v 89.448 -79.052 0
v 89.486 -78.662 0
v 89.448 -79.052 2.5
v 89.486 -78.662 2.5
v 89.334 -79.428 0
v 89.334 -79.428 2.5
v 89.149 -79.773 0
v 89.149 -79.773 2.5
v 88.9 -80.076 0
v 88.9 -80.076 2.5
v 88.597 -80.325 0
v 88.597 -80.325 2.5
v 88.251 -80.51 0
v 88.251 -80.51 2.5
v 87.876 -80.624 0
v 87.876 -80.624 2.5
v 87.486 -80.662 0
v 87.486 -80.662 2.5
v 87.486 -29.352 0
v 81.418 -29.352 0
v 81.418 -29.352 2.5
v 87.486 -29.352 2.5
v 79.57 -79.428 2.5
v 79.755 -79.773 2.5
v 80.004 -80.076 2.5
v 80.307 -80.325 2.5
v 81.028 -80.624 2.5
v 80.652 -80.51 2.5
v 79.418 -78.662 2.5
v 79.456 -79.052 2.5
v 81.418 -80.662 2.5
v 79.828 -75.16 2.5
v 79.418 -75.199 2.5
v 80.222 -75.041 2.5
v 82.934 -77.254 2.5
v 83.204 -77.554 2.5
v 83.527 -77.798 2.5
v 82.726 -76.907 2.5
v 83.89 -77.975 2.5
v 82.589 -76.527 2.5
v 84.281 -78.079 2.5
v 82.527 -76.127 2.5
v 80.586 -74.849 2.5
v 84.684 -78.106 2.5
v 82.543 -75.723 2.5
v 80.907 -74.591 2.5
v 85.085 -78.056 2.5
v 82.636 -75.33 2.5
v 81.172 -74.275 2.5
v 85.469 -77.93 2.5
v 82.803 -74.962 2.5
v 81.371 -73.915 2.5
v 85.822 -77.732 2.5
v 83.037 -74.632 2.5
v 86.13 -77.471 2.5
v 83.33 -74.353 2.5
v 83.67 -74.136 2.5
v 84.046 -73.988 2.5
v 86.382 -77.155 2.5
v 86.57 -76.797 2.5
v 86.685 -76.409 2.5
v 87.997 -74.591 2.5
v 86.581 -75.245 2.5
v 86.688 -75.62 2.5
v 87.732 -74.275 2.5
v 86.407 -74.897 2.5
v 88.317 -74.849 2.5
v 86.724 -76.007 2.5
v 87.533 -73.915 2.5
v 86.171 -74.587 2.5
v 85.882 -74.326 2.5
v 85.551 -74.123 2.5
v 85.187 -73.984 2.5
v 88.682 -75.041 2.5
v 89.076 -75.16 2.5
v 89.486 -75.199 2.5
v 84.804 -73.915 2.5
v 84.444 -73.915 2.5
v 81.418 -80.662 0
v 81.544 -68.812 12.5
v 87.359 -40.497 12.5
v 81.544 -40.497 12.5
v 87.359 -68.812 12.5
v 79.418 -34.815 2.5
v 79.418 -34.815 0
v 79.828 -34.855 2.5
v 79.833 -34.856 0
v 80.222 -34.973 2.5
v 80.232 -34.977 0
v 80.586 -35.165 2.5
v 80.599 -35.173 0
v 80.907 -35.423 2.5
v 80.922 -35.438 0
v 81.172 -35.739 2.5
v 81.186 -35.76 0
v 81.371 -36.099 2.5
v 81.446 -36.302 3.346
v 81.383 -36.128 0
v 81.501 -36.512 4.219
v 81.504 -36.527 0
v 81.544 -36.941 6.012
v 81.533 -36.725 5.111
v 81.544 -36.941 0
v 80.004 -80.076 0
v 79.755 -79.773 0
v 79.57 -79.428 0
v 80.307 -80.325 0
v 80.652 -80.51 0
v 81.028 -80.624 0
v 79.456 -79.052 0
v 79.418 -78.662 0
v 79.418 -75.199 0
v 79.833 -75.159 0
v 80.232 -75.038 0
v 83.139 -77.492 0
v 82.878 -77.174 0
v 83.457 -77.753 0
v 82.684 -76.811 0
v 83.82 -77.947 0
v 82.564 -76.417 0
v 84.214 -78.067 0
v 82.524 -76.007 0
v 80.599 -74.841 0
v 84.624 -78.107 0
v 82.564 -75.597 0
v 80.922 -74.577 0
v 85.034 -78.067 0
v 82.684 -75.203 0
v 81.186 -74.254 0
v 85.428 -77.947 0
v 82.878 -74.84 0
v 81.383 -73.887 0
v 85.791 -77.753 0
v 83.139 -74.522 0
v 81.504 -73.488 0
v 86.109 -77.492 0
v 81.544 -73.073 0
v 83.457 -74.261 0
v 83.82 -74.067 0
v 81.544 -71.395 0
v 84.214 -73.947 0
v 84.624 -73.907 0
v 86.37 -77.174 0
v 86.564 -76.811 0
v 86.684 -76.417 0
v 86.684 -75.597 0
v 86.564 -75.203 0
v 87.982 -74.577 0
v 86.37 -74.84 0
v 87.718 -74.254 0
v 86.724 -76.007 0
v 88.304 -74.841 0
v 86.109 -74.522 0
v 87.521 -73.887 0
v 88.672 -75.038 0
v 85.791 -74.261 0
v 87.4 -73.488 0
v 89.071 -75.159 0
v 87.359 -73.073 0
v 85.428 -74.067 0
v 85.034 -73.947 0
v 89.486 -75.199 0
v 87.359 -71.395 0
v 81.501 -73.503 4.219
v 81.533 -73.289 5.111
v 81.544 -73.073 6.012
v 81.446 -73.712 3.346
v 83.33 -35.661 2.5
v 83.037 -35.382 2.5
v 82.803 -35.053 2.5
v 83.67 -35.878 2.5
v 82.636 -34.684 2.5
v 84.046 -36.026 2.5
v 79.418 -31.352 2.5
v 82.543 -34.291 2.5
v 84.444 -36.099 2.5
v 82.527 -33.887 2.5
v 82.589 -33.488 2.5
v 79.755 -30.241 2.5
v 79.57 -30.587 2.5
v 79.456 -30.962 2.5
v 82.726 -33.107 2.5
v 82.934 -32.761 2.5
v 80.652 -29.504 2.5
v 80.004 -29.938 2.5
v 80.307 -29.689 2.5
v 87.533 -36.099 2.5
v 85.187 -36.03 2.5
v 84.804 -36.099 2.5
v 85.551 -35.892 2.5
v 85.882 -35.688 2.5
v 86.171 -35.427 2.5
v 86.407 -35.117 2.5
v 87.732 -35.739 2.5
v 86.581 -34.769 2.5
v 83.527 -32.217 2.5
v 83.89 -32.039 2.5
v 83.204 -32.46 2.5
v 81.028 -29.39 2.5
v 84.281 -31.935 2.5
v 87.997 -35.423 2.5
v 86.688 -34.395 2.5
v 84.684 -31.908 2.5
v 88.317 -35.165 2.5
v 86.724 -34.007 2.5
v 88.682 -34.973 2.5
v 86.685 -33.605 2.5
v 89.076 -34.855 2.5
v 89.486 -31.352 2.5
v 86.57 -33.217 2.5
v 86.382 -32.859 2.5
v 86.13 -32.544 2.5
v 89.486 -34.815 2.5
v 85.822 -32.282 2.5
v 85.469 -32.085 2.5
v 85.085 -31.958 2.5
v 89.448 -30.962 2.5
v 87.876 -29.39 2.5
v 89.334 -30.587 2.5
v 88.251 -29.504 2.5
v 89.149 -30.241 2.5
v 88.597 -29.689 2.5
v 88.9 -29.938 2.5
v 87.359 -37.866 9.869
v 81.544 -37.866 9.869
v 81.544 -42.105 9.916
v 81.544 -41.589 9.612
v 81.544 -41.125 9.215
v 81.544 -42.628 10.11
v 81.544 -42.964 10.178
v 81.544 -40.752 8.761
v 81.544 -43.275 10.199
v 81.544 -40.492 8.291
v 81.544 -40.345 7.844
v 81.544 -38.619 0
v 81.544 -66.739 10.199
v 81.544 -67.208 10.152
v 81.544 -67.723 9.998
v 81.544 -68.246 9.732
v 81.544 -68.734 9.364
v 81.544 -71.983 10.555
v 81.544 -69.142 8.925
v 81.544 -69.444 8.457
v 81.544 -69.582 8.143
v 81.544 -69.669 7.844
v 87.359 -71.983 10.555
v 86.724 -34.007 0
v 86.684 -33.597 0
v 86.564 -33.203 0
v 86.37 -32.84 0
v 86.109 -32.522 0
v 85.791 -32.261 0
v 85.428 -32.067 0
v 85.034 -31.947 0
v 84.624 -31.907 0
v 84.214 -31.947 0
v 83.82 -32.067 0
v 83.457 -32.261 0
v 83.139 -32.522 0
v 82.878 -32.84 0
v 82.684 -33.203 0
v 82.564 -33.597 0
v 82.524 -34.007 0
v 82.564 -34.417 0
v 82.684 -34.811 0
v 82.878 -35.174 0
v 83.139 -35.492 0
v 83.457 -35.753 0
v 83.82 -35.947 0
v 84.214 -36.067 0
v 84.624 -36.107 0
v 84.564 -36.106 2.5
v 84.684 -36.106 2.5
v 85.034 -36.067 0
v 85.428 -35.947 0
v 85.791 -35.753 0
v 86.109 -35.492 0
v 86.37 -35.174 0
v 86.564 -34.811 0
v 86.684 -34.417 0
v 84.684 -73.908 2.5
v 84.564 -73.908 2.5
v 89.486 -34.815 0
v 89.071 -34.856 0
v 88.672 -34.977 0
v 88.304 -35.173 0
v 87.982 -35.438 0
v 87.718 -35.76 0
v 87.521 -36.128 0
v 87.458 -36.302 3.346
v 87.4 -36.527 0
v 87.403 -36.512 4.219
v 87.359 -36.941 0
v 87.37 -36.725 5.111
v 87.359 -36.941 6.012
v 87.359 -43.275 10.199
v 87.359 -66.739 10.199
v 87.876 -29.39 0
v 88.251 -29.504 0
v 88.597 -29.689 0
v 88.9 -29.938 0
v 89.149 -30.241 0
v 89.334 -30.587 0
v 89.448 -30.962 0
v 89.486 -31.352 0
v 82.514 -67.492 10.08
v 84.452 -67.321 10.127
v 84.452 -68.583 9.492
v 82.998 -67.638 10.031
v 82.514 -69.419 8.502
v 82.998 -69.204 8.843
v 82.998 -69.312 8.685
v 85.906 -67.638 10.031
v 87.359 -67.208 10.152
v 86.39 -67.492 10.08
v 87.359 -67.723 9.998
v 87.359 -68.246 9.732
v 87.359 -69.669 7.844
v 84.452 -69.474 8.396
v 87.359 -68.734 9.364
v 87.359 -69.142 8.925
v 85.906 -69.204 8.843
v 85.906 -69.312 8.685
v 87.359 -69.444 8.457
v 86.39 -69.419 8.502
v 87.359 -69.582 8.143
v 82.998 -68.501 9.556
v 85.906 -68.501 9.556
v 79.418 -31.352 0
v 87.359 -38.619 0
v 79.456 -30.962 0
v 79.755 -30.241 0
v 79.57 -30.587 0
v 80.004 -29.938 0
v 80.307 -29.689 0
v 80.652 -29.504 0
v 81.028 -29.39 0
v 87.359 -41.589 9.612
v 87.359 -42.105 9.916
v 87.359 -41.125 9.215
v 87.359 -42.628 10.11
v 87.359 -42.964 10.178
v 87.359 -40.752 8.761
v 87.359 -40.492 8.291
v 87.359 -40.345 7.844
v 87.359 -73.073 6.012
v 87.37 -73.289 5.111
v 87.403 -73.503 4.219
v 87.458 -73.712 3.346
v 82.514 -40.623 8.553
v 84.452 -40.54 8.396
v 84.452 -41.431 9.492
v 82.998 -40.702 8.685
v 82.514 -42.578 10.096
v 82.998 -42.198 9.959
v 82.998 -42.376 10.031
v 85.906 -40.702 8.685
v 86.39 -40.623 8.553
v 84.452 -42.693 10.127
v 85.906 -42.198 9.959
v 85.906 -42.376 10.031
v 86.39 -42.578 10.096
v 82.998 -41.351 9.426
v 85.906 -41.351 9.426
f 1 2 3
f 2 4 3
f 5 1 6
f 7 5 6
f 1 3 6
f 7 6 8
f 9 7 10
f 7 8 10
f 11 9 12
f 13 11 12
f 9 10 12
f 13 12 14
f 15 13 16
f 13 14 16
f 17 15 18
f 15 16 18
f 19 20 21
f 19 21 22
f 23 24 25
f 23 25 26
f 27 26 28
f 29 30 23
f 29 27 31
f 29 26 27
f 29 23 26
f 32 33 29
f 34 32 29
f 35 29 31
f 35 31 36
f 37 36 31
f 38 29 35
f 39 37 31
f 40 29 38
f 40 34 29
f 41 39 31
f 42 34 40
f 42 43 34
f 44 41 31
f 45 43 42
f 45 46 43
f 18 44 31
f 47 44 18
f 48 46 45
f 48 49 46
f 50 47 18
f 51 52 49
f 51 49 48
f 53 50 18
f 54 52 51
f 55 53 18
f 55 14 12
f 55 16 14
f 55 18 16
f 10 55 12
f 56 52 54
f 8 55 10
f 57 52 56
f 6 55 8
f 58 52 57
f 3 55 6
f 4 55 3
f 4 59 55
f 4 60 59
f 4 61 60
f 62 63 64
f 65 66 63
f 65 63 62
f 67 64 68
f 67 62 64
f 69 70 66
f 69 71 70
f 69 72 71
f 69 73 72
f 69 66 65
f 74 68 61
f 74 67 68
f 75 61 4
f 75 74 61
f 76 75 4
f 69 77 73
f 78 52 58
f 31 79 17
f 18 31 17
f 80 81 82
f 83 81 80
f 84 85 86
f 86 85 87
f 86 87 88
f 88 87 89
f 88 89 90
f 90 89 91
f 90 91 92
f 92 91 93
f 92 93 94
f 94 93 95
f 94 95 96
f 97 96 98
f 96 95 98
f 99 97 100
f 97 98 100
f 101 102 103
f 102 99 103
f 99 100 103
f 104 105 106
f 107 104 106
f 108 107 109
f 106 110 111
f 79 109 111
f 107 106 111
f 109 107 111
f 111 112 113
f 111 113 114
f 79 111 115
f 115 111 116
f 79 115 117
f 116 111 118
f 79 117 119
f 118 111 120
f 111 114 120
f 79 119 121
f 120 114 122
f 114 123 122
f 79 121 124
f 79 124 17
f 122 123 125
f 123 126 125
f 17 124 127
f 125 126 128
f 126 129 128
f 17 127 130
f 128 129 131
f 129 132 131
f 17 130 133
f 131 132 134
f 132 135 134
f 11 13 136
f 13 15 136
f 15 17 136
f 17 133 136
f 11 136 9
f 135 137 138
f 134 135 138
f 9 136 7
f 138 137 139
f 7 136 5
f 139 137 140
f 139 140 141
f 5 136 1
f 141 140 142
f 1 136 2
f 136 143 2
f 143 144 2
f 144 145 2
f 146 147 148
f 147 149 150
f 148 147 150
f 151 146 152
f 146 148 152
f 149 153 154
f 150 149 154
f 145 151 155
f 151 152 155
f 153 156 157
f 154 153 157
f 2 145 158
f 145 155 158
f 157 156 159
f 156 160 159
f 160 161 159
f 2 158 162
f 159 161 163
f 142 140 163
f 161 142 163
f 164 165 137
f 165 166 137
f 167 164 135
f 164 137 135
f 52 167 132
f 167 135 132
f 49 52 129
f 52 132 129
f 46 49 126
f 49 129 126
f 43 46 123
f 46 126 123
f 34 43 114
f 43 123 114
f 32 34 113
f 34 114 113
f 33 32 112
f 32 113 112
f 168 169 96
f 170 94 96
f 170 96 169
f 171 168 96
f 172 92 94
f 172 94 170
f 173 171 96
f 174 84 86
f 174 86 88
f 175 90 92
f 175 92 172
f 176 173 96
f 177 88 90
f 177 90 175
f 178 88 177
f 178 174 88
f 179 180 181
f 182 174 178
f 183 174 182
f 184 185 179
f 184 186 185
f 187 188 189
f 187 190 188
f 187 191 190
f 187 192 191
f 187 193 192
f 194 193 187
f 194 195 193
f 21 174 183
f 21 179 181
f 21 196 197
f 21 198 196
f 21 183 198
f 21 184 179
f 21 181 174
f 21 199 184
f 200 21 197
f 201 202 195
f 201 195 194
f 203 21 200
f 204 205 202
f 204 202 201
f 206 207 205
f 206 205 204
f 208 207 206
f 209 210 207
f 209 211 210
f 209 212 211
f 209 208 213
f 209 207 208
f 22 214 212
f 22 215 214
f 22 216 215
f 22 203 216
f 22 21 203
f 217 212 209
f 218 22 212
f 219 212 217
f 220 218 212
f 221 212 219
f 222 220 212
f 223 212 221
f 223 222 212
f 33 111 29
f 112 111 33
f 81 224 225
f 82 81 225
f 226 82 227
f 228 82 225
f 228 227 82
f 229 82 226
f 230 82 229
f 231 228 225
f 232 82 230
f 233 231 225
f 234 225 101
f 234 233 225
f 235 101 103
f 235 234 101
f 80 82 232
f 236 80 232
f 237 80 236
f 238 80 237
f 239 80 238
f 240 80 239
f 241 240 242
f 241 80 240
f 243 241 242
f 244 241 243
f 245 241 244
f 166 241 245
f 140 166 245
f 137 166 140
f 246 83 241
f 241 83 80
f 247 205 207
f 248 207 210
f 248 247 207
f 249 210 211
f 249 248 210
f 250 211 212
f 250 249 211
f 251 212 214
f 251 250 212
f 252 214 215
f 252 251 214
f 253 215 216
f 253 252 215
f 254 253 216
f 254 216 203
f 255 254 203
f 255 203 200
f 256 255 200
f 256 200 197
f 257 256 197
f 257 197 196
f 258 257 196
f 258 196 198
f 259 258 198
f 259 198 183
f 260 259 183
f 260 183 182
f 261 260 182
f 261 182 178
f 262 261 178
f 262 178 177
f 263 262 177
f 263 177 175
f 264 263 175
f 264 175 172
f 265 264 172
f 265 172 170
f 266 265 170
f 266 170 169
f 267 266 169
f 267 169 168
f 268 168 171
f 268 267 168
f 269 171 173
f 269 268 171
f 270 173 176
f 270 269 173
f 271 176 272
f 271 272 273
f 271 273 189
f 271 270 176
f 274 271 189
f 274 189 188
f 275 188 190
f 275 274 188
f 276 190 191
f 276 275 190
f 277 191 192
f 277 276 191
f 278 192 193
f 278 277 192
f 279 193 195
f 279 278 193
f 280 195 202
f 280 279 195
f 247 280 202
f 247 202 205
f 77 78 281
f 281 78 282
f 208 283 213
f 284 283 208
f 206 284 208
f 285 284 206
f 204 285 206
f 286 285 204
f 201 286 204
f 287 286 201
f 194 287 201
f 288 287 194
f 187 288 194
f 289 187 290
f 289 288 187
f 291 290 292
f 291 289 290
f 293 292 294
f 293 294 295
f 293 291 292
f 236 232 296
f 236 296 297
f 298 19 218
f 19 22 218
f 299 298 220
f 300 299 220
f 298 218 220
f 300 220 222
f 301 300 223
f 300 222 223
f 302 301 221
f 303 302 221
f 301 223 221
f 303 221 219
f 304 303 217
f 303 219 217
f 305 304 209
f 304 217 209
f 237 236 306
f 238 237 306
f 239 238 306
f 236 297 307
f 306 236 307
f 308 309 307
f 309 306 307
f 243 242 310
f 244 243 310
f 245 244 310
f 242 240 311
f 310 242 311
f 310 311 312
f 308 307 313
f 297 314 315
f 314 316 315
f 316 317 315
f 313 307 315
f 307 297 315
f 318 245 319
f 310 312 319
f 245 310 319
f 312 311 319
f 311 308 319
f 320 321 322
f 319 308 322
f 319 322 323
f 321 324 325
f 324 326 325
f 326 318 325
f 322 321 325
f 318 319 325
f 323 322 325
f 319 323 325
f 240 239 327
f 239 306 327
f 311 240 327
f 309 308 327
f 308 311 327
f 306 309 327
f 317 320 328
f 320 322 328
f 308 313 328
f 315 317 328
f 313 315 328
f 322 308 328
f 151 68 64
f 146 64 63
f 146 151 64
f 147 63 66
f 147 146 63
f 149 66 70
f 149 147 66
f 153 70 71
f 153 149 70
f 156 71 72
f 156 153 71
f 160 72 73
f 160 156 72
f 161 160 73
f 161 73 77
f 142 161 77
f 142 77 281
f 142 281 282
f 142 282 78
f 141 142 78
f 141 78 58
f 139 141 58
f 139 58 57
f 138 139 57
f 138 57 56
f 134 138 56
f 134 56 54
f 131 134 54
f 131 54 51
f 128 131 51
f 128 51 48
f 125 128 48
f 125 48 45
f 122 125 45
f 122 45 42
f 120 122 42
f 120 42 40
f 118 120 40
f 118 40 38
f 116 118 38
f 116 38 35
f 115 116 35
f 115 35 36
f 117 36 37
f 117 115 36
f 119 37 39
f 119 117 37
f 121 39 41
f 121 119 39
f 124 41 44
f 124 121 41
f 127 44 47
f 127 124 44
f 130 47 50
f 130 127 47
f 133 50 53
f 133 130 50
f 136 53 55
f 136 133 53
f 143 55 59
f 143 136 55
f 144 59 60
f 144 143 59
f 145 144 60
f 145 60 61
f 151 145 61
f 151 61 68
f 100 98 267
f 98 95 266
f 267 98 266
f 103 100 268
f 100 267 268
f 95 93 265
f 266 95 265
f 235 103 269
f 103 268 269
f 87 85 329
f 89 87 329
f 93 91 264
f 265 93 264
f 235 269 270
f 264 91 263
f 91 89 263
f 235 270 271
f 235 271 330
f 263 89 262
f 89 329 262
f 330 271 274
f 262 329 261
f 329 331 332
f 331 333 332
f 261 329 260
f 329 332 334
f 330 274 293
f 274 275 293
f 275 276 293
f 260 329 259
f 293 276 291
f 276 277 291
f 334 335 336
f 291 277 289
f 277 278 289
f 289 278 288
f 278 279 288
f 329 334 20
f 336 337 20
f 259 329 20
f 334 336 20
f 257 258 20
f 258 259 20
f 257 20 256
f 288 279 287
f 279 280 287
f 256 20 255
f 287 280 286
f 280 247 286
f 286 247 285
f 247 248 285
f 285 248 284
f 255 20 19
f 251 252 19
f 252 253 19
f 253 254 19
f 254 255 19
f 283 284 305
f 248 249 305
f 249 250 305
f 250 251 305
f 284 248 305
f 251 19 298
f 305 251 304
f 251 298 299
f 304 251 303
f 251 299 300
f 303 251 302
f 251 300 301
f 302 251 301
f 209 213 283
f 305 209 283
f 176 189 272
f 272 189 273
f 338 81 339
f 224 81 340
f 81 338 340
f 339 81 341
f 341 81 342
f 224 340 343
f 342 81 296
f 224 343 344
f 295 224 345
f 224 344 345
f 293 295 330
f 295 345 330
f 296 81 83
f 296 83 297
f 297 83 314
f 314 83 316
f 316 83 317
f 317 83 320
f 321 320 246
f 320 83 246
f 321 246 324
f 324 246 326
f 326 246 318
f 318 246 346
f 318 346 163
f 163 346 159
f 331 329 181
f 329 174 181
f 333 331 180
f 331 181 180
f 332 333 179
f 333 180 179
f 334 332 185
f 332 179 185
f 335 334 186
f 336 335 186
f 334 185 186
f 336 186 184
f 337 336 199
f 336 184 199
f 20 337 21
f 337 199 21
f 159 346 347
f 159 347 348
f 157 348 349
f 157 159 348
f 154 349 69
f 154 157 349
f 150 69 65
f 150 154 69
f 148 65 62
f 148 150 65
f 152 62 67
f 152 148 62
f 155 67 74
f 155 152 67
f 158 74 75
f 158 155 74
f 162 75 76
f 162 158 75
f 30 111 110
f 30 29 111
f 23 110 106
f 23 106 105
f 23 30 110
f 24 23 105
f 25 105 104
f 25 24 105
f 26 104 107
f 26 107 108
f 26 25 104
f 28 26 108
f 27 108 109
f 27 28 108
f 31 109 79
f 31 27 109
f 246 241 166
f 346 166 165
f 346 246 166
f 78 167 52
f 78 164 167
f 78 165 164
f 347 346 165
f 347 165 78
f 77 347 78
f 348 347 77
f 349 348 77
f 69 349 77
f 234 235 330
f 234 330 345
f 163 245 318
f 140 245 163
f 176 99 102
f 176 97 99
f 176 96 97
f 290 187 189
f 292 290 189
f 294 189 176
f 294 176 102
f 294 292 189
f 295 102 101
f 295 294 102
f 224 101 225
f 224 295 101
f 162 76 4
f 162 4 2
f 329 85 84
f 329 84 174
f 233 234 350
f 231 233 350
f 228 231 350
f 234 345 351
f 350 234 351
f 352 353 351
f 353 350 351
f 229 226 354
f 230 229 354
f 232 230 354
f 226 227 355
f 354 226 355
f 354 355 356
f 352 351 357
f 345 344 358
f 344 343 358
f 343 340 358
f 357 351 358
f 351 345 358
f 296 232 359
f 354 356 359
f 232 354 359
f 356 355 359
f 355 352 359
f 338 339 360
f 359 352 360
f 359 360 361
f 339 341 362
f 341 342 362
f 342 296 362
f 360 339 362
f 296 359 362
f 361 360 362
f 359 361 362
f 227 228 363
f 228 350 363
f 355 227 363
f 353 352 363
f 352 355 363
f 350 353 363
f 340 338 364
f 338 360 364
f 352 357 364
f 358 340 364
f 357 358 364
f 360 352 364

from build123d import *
from OCP.BRepFilletAPI import BRepFilletAPI_MakeChamfer

# Parameters (mm, degrees)
SKETCH_1_W               = 10.068208361
SKETCH_1_H               = 51.310344827
SKETCH_1_R               = 2.1
EXTRUDE_1_DEPTH          = 2.5
EXTRUDE_2_REACH          = 83.327
CUT_EXTRUDE_1_DEPTH      = 83.243670079
CUT_EXTRUDE_1_DEPTH_BACK = 83.243670079
CUT_EXTRUDE_2_DEPTH      = 122.121367623
CUT_EXTRUDE_2_DEPTH_BACK = 122.121367623
FILLET_2_R               = 2
CHAMFER_2_SIZE           = 2
CHAMFER_2_SIZE2          = 2.70532723


with BuildPart() as part:
    # 草图1 → 凸台-拉伸1 (new body)
    with BuildSketch(Plane.XY):
        with Locations((84.451834639, -55.007101597)):
            Rectangle(SKETCH_1_W, SKETCH_1_H)
        with Locations((84.623869854, -34.007101596)):
            Circle(SKETCH_1_R, mode=Mode.SUBTRACT)
        with Locations((84.623869854, -76.007101596)):
            Circle(SKETCH_1_R, mode=Mode.SUBTRACT)
    extrude(amount=EXTRUDE_1_DEPTH)

    # 凸台-拉伸2: up to this face of the body (flat: up to its plane)
    extrude_2_end = Plane(part.part.faces().sort_by_distance((79.417730458, -55.007101596, 1.25))[0])
    # 草图2 → 凸台-拉伸2 (add, up to the picked face)
    with BuildSketch(Plane(origin=(89.485938819, 0, 0), x_dir=(0, 0, -1), z_dir=(1, 0, 0)), mode=Mode.PRIVATE) as extrude_2_sk1:
        Polygon((-12.5, -71.517171054), (-2.5, -73.914822505), (-2.5, -36.099380688), (-12.5, -38.497032139), align=None)
    extrude_2_tool1 = split(extrude(extrude_2_sk1.sketch, amount=-EXTRUDE_2_REACH, mode=Mode.PRIVATE), bisect_by=extrude_2_end, keep=Keep.BOTH, mode=Mode.PRIVATE)
    add(extrude_2_tool1.solids().sort_by(Axis((89.485939, -55.007102, 7.387173), (-1, 0, 0)))[0])

    # 草图3 → 切除-拉伸1 (cut, two sides: drawn at the far end of the back side and taken through both)
    with BuildSketch(Plane(origin=(89.485938819, 0, 0), x_dir=(0, 0, -1), z_dir=(1, 0, 0)).offset(-CUT_EXTRUDE_1_DEPTH_BACK)):
        Polygon((-10.198786391, -69.151033694), (0, -71.395312685), (0, -38.618890508), (-10.198786391, -40.863169498), align=None)
    extrude(amount=CUT_EXTRUDE_1_DEPTH + CUT_EXTRUDE_1_DEPTH_BACK, mode=Mode.SUBTRACT)

    # 草图4 → 切除-拉伸2 (cut, two sides: drawn at the far end of the back side and taken through both)
    with BuildSketch(Plane.XY.offset(12.5).offset(-CUT_EXTRUDE_2_DEPTH_BACK)):
        with BuildLine():
            Line((81.544440974, -36.941486908), (81.544440974, -73.072716285))
            ThreePointArc((81.544440974, -73.072716285), (79.417730458, -75.199426802), (77.291019941, -73.072716285))
            Line((77.291019941, -73.072716285), (77.291019941, -36.941486908))
            ThreePointArc((77.291019941, -36.941486908), (79.417730458, -34.814776391), (81.544440974, -36.941486908))
        make_face()
        with BuildLine():
            Line((87.359228302, -36.941486908), (87.359228302, -73.072716285))
            ThreePointArc((87.359228302, -73.072716285), (89.485938819, -75.199426802), (91.612649336, -73.072716285))
            Line((91.612649336, -73.072716285), (91.612649336, -36.941486908))
            ThreePointArc((91.612649336, -36.941486908), (89.485938819, -34.814776391), (87.359228302, -36.941486908))
        make_face()
    extrude(amount=CUT_EXTRUDE_2_DEPTH + CUT_EXTRUDE_2_DEPTH_BACK, mode=Mode.SUBTRACT)

    # 圆角1
    # a fillet whose section is not a circle: 3 mm, written as the material it adds along each edge
    with BuildSketch(Plane(origin=(87.359228302, -40.863169498, 10.198786391), x_dir=(0, 0.2149116520268582, -0.9766334941128564), z_dir=(-1, 0, 0)), Plane(origin=(87.359228302, -69.151033694, 10.198786391), x_dir=(0, 1, 0), z_dir=(-1, 0, 0))) as fillet_1_piece_1:
        with BuildLine():
            Bezier((2.411616085, 0), (0, 0), (-0.518284397, 2.355265044), weights=[1, 0.666666667, 1])
            Line((-0.518284397, 2.355265044), (0, 0))
            Line((0, 0), (2.411616085, 0))
        make_face()
    extrude(amount=5.814787328)

    # 圆角2
    fillet_2_edges = [part.edges().sort_by_distance(p)[0] for p in [
        (89.485938819, -80.66227401, 1.25),
        (79.417730458, -80.66227401, 1.25),
        (79.417730458, -29.351929183, 1.25),
        (89.485938819, -29.351929183, 1.25),
    ]]
    fillet(fillet_2_edges, radius=FILLET_2_R)

    # 倒角2: one chamfer whose edges measure the first distance from different faces: ONE call of the kernel's chamfer builder (chamfer() names one face for all edges)
    chamfer_2_edges_1 = [part.edges().sort_by_distance(p)[0] for p in [
        (84.451834638, -71.517171054, 12.5),
    ]]
    chamfer_2_side_1 = [part.faces().sort_by_distance(p)[0] for p in [
        (84.451834638, -72.722762821, 7.471780545),
    ]]
    chamfer_2_edges_2 = [part.edges().sort_by_distance(p)[0] for p in [
        (84.451834638, -38.497032139, 12.5),
    ]]
    chamfer_2_side_2 = [part.faces().sort_by_distance(p)[0] for p in [
        (84.451834638, -55.007101596, 12.5),
    ]]
    chamfer_2 = BRepFilletAPI_MakeChamfer(part.part.solid().wrapped)
    for e in chamfer_2_edges_1:
        chamfer_2.Add(CHAMFER_2_SIZE, CHAMFER_2_SIZE2, e.wrapped, chamfer_2_side_1[0].wrapped)  # the first distance lies on this face
    for e in chamfer_2_edges_2:
        chamfer_2.Add(CHAMFER_2_SIZE, CHAMFER_2_SIZE2, e.wrapped, chamfer_2_side_2[0].wrapped)  # the first distance lies on this face
    add(Compound.cast(chamfer_2.Shape()), mode=Mode.REPLACE)


solid = part.part
